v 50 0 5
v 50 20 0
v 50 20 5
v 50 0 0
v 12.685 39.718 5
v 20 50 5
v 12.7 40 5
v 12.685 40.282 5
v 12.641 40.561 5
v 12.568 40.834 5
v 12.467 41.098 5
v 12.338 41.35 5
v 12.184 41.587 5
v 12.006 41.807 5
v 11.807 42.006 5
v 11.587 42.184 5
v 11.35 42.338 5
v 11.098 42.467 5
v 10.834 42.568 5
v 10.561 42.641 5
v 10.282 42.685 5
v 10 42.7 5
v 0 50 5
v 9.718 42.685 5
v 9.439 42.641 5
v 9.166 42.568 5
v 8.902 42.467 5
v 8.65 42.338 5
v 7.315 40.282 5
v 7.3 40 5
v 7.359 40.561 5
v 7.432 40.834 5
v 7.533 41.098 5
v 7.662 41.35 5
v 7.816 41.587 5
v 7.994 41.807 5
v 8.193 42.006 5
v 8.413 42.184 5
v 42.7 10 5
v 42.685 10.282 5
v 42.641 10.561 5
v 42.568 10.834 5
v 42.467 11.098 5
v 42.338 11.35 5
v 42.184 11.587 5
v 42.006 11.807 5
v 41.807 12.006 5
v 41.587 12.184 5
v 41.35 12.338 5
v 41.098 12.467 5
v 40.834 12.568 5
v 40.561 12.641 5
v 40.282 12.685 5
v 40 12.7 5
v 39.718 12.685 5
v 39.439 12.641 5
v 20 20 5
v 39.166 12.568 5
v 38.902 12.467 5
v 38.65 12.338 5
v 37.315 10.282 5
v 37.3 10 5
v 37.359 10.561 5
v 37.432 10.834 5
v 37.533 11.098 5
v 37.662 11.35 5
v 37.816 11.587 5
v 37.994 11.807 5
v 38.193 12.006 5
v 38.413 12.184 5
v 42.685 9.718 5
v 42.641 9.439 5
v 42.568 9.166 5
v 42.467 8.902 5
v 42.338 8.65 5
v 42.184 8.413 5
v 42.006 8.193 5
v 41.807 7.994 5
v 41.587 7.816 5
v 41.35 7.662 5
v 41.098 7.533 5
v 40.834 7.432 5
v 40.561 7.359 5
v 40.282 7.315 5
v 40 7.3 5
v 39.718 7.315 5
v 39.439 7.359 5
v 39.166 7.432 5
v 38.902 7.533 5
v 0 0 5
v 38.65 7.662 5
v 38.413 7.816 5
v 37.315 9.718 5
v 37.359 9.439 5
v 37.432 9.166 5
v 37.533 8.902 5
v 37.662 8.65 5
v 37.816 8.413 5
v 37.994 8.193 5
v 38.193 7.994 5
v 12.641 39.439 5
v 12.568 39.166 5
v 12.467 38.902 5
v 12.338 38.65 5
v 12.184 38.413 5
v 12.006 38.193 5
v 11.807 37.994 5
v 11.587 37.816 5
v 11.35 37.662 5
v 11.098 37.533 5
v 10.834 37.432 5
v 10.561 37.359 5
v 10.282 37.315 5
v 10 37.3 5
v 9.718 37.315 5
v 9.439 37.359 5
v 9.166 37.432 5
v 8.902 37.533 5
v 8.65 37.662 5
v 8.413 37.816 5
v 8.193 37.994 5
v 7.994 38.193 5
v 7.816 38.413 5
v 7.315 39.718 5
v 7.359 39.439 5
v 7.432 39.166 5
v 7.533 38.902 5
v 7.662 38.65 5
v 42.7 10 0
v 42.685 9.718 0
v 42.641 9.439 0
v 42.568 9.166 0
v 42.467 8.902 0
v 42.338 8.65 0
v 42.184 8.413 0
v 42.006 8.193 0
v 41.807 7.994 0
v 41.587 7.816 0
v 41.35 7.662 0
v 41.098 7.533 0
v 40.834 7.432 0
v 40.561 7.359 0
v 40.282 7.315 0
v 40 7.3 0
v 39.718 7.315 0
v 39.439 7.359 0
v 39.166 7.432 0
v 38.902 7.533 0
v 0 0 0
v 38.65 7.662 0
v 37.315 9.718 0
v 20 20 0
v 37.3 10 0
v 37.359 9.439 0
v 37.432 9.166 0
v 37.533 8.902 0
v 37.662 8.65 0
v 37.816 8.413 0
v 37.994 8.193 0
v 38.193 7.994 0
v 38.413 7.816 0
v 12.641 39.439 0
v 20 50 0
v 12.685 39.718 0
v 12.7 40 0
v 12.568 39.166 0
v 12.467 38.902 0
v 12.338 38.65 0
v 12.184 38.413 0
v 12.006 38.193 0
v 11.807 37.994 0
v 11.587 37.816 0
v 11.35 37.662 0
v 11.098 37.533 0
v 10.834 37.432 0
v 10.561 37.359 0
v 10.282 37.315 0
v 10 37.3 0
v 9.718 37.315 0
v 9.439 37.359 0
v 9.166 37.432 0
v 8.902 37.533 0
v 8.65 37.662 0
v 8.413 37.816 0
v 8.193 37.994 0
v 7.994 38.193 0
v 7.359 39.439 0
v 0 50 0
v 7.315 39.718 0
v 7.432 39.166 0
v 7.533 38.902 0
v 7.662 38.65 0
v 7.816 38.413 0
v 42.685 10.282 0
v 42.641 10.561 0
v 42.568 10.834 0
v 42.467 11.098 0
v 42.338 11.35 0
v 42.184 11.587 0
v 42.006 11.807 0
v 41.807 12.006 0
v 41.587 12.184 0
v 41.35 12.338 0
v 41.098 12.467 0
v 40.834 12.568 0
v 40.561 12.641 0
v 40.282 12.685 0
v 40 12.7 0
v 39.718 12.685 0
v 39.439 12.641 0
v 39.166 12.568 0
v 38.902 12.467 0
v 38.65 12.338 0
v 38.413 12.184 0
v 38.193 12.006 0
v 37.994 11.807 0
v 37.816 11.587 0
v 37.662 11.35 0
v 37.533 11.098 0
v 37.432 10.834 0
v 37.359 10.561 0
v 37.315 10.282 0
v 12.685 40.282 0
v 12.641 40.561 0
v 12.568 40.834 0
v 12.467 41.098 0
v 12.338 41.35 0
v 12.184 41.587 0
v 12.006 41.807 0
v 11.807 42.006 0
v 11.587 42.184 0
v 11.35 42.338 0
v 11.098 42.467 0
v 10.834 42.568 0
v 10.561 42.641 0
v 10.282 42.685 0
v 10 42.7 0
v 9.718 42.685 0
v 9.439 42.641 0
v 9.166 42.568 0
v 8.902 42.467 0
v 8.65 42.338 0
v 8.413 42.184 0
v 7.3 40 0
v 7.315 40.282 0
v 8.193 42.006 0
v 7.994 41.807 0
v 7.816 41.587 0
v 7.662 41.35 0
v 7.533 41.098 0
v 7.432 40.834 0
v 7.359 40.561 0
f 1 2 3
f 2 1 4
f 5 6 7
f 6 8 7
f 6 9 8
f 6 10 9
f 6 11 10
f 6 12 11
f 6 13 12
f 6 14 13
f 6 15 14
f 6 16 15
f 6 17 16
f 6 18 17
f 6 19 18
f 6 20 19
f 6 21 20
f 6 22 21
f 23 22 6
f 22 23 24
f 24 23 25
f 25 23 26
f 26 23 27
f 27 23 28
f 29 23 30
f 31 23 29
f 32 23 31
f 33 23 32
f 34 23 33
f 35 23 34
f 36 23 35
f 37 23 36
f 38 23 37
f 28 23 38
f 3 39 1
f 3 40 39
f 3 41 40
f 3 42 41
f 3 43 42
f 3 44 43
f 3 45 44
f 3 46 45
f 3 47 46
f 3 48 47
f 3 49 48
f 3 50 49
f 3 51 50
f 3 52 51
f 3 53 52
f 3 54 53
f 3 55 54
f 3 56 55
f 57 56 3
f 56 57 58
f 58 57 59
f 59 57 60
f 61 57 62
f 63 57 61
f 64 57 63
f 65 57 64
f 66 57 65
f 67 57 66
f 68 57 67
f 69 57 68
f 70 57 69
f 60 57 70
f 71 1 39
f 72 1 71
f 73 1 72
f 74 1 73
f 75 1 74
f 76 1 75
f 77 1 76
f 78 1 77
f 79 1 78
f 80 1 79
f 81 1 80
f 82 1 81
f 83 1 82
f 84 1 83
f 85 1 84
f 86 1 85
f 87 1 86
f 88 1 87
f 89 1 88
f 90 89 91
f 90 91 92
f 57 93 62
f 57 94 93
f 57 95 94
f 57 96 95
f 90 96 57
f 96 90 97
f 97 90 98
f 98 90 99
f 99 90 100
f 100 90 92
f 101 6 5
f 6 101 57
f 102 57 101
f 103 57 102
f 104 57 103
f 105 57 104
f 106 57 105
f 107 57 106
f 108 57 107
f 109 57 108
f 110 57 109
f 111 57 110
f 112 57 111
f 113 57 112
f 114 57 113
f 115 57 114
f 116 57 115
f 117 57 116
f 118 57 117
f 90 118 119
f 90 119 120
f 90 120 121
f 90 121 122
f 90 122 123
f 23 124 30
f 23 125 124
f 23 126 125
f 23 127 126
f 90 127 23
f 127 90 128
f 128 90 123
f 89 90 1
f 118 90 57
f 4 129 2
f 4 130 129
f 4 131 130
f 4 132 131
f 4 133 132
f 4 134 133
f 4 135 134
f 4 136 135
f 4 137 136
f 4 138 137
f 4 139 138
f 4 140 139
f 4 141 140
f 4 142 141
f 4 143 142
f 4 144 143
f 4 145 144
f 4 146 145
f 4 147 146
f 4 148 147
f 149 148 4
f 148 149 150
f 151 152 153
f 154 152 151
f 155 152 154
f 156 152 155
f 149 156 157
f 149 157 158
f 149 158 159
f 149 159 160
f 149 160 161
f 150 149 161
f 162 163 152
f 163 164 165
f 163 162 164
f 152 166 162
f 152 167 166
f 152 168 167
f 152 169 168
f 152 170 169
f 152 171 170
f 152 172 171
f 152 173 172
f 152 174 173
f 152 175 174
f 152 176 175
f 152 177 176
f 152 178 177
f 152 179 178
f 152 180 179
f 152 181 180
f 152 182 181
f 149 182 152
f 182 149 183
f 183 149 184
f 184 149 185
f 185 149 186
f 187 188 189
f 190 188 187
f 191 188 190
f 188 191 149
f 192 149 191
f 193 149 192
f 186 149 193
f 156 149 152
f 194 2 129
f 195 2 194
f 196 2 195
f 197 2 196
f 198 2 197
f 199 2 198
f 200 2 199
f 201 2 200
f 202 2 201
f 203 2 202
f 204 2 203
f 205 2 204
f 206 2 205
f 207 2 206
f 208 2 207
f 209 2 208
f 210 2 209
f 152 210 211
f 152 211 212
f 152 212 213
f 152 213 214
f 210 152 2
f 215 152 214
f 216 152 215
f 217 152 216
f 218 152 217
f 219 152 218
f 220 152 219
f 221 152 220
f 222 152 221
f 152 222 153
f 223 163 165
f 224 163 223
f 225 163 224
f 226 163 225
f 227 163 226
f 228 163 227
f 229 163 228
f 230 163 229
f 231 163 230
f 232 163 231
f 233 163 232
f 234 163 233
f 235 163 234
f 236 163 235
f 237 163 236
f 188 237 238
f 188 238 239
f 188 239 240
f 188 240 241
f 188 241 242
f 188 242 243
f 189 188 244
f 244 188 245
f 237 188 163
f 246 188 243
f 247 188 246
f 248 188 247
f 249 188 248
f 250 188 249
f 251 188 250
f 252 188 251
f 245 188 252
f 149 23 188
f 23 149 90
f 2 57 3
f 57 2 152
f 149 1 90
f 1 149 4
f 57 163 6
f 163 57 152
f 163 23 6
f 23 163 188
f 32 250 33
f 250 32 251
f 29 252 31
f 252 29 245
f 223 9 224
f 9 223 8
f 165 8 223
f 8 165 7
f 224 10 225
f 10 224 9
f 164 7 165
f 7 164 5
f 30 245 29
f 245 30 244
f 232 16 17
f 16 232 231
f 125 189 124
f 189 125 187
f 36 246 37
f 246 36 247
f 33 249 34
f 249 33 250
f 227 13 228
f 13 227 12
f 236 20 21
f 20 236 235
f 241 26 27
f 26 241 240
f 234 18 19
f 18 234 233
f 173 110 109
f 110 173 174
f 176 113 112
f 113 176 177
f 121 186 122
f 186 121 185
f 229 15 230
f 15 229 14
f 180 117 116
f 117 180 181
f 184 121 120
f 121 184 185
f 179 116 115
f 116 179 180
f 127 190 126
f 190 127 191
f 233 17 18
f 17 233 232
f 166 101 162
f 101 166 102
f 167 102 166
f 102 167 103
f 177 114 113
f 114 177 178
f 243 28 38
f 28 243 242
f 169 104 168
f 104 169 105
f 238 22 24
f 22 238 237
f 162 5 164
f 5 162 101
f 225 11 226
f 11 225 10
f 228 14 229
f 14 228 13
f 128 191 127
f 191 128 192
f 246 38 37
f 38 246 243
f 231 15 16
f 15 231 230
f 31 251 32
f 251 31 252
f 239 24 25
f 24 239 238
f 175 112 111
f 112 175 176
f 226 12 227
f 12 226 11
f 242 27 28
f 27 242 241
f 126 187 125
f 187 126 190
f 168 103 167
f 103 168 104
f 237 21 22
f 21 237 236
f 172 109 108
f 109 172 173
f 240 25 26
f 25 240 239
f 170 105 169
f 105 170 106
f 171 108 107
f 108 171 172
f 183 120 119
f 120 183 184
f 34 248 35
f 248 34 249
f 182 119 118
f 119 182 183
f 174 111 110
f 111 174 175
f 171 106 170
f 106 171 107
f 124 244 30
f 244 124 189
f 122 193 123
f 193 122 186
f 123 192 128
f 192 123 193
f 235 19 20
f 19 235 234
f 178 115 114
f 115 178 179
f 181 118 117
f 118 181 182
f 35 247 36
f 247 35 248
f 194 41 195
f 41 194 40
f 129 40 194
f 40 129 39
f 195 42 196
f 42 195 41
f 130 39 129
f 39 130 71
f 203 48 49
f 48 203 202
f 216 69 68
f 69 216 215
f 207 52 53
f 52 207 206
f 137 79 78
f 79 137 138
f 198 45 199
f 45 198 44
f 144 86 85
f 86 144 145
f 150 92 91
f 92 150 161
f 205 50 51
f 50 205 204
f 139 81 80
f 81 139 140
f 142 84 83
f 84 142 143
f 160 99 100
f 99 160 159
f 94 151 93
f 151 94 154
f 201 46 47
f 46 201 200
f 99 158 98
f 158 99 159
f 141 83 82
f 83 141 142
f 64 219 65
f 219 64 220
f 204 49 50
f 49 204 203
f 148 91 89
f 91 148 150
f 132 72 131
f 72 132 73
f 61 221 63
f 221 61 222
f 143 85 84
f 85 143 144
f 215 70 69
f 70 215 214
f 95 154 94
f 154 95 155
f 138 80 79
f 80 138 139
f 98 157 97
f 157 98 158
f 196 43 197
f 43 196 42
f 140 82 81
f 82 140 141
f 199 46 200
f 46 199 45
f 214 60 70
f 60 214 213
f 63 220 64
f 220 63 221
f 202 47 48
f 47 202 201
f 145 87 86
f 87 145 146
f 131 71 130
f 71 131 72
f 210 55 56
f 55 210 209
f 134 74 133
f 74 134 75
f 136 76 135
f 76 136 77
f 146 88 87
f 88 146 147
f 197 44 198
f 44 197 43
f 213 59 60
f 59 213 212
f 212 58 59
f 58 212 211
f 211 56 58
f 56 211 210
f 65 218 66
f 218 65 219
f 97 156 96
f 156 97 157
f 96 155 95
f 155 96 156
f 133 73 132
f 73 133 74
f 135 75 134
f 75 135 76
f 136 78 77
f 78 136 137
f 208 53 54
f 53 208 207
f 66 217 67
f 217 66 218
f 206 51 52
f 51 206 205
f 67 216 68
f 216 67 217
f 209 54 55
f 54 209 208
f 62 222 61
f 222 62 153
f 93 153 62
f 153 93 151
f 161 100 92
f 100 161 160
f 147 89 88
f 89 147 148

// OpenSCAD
// V-slot corner connector.
$fn = 60;
eps = 0.02;
profile = 20;
arm = 50;
plate_t = 5;
difference() {
    union() { cube([arm,profile,plate_t]); cube([profile,arm,plate_t]); }
    for (p=[[profile/2,arm-profile/2],[arm-profile/2,profile/2]]) translate([p[0],p[1],-eps]) cylinder(d=5.4,h=plate_t+2*eps);
}
